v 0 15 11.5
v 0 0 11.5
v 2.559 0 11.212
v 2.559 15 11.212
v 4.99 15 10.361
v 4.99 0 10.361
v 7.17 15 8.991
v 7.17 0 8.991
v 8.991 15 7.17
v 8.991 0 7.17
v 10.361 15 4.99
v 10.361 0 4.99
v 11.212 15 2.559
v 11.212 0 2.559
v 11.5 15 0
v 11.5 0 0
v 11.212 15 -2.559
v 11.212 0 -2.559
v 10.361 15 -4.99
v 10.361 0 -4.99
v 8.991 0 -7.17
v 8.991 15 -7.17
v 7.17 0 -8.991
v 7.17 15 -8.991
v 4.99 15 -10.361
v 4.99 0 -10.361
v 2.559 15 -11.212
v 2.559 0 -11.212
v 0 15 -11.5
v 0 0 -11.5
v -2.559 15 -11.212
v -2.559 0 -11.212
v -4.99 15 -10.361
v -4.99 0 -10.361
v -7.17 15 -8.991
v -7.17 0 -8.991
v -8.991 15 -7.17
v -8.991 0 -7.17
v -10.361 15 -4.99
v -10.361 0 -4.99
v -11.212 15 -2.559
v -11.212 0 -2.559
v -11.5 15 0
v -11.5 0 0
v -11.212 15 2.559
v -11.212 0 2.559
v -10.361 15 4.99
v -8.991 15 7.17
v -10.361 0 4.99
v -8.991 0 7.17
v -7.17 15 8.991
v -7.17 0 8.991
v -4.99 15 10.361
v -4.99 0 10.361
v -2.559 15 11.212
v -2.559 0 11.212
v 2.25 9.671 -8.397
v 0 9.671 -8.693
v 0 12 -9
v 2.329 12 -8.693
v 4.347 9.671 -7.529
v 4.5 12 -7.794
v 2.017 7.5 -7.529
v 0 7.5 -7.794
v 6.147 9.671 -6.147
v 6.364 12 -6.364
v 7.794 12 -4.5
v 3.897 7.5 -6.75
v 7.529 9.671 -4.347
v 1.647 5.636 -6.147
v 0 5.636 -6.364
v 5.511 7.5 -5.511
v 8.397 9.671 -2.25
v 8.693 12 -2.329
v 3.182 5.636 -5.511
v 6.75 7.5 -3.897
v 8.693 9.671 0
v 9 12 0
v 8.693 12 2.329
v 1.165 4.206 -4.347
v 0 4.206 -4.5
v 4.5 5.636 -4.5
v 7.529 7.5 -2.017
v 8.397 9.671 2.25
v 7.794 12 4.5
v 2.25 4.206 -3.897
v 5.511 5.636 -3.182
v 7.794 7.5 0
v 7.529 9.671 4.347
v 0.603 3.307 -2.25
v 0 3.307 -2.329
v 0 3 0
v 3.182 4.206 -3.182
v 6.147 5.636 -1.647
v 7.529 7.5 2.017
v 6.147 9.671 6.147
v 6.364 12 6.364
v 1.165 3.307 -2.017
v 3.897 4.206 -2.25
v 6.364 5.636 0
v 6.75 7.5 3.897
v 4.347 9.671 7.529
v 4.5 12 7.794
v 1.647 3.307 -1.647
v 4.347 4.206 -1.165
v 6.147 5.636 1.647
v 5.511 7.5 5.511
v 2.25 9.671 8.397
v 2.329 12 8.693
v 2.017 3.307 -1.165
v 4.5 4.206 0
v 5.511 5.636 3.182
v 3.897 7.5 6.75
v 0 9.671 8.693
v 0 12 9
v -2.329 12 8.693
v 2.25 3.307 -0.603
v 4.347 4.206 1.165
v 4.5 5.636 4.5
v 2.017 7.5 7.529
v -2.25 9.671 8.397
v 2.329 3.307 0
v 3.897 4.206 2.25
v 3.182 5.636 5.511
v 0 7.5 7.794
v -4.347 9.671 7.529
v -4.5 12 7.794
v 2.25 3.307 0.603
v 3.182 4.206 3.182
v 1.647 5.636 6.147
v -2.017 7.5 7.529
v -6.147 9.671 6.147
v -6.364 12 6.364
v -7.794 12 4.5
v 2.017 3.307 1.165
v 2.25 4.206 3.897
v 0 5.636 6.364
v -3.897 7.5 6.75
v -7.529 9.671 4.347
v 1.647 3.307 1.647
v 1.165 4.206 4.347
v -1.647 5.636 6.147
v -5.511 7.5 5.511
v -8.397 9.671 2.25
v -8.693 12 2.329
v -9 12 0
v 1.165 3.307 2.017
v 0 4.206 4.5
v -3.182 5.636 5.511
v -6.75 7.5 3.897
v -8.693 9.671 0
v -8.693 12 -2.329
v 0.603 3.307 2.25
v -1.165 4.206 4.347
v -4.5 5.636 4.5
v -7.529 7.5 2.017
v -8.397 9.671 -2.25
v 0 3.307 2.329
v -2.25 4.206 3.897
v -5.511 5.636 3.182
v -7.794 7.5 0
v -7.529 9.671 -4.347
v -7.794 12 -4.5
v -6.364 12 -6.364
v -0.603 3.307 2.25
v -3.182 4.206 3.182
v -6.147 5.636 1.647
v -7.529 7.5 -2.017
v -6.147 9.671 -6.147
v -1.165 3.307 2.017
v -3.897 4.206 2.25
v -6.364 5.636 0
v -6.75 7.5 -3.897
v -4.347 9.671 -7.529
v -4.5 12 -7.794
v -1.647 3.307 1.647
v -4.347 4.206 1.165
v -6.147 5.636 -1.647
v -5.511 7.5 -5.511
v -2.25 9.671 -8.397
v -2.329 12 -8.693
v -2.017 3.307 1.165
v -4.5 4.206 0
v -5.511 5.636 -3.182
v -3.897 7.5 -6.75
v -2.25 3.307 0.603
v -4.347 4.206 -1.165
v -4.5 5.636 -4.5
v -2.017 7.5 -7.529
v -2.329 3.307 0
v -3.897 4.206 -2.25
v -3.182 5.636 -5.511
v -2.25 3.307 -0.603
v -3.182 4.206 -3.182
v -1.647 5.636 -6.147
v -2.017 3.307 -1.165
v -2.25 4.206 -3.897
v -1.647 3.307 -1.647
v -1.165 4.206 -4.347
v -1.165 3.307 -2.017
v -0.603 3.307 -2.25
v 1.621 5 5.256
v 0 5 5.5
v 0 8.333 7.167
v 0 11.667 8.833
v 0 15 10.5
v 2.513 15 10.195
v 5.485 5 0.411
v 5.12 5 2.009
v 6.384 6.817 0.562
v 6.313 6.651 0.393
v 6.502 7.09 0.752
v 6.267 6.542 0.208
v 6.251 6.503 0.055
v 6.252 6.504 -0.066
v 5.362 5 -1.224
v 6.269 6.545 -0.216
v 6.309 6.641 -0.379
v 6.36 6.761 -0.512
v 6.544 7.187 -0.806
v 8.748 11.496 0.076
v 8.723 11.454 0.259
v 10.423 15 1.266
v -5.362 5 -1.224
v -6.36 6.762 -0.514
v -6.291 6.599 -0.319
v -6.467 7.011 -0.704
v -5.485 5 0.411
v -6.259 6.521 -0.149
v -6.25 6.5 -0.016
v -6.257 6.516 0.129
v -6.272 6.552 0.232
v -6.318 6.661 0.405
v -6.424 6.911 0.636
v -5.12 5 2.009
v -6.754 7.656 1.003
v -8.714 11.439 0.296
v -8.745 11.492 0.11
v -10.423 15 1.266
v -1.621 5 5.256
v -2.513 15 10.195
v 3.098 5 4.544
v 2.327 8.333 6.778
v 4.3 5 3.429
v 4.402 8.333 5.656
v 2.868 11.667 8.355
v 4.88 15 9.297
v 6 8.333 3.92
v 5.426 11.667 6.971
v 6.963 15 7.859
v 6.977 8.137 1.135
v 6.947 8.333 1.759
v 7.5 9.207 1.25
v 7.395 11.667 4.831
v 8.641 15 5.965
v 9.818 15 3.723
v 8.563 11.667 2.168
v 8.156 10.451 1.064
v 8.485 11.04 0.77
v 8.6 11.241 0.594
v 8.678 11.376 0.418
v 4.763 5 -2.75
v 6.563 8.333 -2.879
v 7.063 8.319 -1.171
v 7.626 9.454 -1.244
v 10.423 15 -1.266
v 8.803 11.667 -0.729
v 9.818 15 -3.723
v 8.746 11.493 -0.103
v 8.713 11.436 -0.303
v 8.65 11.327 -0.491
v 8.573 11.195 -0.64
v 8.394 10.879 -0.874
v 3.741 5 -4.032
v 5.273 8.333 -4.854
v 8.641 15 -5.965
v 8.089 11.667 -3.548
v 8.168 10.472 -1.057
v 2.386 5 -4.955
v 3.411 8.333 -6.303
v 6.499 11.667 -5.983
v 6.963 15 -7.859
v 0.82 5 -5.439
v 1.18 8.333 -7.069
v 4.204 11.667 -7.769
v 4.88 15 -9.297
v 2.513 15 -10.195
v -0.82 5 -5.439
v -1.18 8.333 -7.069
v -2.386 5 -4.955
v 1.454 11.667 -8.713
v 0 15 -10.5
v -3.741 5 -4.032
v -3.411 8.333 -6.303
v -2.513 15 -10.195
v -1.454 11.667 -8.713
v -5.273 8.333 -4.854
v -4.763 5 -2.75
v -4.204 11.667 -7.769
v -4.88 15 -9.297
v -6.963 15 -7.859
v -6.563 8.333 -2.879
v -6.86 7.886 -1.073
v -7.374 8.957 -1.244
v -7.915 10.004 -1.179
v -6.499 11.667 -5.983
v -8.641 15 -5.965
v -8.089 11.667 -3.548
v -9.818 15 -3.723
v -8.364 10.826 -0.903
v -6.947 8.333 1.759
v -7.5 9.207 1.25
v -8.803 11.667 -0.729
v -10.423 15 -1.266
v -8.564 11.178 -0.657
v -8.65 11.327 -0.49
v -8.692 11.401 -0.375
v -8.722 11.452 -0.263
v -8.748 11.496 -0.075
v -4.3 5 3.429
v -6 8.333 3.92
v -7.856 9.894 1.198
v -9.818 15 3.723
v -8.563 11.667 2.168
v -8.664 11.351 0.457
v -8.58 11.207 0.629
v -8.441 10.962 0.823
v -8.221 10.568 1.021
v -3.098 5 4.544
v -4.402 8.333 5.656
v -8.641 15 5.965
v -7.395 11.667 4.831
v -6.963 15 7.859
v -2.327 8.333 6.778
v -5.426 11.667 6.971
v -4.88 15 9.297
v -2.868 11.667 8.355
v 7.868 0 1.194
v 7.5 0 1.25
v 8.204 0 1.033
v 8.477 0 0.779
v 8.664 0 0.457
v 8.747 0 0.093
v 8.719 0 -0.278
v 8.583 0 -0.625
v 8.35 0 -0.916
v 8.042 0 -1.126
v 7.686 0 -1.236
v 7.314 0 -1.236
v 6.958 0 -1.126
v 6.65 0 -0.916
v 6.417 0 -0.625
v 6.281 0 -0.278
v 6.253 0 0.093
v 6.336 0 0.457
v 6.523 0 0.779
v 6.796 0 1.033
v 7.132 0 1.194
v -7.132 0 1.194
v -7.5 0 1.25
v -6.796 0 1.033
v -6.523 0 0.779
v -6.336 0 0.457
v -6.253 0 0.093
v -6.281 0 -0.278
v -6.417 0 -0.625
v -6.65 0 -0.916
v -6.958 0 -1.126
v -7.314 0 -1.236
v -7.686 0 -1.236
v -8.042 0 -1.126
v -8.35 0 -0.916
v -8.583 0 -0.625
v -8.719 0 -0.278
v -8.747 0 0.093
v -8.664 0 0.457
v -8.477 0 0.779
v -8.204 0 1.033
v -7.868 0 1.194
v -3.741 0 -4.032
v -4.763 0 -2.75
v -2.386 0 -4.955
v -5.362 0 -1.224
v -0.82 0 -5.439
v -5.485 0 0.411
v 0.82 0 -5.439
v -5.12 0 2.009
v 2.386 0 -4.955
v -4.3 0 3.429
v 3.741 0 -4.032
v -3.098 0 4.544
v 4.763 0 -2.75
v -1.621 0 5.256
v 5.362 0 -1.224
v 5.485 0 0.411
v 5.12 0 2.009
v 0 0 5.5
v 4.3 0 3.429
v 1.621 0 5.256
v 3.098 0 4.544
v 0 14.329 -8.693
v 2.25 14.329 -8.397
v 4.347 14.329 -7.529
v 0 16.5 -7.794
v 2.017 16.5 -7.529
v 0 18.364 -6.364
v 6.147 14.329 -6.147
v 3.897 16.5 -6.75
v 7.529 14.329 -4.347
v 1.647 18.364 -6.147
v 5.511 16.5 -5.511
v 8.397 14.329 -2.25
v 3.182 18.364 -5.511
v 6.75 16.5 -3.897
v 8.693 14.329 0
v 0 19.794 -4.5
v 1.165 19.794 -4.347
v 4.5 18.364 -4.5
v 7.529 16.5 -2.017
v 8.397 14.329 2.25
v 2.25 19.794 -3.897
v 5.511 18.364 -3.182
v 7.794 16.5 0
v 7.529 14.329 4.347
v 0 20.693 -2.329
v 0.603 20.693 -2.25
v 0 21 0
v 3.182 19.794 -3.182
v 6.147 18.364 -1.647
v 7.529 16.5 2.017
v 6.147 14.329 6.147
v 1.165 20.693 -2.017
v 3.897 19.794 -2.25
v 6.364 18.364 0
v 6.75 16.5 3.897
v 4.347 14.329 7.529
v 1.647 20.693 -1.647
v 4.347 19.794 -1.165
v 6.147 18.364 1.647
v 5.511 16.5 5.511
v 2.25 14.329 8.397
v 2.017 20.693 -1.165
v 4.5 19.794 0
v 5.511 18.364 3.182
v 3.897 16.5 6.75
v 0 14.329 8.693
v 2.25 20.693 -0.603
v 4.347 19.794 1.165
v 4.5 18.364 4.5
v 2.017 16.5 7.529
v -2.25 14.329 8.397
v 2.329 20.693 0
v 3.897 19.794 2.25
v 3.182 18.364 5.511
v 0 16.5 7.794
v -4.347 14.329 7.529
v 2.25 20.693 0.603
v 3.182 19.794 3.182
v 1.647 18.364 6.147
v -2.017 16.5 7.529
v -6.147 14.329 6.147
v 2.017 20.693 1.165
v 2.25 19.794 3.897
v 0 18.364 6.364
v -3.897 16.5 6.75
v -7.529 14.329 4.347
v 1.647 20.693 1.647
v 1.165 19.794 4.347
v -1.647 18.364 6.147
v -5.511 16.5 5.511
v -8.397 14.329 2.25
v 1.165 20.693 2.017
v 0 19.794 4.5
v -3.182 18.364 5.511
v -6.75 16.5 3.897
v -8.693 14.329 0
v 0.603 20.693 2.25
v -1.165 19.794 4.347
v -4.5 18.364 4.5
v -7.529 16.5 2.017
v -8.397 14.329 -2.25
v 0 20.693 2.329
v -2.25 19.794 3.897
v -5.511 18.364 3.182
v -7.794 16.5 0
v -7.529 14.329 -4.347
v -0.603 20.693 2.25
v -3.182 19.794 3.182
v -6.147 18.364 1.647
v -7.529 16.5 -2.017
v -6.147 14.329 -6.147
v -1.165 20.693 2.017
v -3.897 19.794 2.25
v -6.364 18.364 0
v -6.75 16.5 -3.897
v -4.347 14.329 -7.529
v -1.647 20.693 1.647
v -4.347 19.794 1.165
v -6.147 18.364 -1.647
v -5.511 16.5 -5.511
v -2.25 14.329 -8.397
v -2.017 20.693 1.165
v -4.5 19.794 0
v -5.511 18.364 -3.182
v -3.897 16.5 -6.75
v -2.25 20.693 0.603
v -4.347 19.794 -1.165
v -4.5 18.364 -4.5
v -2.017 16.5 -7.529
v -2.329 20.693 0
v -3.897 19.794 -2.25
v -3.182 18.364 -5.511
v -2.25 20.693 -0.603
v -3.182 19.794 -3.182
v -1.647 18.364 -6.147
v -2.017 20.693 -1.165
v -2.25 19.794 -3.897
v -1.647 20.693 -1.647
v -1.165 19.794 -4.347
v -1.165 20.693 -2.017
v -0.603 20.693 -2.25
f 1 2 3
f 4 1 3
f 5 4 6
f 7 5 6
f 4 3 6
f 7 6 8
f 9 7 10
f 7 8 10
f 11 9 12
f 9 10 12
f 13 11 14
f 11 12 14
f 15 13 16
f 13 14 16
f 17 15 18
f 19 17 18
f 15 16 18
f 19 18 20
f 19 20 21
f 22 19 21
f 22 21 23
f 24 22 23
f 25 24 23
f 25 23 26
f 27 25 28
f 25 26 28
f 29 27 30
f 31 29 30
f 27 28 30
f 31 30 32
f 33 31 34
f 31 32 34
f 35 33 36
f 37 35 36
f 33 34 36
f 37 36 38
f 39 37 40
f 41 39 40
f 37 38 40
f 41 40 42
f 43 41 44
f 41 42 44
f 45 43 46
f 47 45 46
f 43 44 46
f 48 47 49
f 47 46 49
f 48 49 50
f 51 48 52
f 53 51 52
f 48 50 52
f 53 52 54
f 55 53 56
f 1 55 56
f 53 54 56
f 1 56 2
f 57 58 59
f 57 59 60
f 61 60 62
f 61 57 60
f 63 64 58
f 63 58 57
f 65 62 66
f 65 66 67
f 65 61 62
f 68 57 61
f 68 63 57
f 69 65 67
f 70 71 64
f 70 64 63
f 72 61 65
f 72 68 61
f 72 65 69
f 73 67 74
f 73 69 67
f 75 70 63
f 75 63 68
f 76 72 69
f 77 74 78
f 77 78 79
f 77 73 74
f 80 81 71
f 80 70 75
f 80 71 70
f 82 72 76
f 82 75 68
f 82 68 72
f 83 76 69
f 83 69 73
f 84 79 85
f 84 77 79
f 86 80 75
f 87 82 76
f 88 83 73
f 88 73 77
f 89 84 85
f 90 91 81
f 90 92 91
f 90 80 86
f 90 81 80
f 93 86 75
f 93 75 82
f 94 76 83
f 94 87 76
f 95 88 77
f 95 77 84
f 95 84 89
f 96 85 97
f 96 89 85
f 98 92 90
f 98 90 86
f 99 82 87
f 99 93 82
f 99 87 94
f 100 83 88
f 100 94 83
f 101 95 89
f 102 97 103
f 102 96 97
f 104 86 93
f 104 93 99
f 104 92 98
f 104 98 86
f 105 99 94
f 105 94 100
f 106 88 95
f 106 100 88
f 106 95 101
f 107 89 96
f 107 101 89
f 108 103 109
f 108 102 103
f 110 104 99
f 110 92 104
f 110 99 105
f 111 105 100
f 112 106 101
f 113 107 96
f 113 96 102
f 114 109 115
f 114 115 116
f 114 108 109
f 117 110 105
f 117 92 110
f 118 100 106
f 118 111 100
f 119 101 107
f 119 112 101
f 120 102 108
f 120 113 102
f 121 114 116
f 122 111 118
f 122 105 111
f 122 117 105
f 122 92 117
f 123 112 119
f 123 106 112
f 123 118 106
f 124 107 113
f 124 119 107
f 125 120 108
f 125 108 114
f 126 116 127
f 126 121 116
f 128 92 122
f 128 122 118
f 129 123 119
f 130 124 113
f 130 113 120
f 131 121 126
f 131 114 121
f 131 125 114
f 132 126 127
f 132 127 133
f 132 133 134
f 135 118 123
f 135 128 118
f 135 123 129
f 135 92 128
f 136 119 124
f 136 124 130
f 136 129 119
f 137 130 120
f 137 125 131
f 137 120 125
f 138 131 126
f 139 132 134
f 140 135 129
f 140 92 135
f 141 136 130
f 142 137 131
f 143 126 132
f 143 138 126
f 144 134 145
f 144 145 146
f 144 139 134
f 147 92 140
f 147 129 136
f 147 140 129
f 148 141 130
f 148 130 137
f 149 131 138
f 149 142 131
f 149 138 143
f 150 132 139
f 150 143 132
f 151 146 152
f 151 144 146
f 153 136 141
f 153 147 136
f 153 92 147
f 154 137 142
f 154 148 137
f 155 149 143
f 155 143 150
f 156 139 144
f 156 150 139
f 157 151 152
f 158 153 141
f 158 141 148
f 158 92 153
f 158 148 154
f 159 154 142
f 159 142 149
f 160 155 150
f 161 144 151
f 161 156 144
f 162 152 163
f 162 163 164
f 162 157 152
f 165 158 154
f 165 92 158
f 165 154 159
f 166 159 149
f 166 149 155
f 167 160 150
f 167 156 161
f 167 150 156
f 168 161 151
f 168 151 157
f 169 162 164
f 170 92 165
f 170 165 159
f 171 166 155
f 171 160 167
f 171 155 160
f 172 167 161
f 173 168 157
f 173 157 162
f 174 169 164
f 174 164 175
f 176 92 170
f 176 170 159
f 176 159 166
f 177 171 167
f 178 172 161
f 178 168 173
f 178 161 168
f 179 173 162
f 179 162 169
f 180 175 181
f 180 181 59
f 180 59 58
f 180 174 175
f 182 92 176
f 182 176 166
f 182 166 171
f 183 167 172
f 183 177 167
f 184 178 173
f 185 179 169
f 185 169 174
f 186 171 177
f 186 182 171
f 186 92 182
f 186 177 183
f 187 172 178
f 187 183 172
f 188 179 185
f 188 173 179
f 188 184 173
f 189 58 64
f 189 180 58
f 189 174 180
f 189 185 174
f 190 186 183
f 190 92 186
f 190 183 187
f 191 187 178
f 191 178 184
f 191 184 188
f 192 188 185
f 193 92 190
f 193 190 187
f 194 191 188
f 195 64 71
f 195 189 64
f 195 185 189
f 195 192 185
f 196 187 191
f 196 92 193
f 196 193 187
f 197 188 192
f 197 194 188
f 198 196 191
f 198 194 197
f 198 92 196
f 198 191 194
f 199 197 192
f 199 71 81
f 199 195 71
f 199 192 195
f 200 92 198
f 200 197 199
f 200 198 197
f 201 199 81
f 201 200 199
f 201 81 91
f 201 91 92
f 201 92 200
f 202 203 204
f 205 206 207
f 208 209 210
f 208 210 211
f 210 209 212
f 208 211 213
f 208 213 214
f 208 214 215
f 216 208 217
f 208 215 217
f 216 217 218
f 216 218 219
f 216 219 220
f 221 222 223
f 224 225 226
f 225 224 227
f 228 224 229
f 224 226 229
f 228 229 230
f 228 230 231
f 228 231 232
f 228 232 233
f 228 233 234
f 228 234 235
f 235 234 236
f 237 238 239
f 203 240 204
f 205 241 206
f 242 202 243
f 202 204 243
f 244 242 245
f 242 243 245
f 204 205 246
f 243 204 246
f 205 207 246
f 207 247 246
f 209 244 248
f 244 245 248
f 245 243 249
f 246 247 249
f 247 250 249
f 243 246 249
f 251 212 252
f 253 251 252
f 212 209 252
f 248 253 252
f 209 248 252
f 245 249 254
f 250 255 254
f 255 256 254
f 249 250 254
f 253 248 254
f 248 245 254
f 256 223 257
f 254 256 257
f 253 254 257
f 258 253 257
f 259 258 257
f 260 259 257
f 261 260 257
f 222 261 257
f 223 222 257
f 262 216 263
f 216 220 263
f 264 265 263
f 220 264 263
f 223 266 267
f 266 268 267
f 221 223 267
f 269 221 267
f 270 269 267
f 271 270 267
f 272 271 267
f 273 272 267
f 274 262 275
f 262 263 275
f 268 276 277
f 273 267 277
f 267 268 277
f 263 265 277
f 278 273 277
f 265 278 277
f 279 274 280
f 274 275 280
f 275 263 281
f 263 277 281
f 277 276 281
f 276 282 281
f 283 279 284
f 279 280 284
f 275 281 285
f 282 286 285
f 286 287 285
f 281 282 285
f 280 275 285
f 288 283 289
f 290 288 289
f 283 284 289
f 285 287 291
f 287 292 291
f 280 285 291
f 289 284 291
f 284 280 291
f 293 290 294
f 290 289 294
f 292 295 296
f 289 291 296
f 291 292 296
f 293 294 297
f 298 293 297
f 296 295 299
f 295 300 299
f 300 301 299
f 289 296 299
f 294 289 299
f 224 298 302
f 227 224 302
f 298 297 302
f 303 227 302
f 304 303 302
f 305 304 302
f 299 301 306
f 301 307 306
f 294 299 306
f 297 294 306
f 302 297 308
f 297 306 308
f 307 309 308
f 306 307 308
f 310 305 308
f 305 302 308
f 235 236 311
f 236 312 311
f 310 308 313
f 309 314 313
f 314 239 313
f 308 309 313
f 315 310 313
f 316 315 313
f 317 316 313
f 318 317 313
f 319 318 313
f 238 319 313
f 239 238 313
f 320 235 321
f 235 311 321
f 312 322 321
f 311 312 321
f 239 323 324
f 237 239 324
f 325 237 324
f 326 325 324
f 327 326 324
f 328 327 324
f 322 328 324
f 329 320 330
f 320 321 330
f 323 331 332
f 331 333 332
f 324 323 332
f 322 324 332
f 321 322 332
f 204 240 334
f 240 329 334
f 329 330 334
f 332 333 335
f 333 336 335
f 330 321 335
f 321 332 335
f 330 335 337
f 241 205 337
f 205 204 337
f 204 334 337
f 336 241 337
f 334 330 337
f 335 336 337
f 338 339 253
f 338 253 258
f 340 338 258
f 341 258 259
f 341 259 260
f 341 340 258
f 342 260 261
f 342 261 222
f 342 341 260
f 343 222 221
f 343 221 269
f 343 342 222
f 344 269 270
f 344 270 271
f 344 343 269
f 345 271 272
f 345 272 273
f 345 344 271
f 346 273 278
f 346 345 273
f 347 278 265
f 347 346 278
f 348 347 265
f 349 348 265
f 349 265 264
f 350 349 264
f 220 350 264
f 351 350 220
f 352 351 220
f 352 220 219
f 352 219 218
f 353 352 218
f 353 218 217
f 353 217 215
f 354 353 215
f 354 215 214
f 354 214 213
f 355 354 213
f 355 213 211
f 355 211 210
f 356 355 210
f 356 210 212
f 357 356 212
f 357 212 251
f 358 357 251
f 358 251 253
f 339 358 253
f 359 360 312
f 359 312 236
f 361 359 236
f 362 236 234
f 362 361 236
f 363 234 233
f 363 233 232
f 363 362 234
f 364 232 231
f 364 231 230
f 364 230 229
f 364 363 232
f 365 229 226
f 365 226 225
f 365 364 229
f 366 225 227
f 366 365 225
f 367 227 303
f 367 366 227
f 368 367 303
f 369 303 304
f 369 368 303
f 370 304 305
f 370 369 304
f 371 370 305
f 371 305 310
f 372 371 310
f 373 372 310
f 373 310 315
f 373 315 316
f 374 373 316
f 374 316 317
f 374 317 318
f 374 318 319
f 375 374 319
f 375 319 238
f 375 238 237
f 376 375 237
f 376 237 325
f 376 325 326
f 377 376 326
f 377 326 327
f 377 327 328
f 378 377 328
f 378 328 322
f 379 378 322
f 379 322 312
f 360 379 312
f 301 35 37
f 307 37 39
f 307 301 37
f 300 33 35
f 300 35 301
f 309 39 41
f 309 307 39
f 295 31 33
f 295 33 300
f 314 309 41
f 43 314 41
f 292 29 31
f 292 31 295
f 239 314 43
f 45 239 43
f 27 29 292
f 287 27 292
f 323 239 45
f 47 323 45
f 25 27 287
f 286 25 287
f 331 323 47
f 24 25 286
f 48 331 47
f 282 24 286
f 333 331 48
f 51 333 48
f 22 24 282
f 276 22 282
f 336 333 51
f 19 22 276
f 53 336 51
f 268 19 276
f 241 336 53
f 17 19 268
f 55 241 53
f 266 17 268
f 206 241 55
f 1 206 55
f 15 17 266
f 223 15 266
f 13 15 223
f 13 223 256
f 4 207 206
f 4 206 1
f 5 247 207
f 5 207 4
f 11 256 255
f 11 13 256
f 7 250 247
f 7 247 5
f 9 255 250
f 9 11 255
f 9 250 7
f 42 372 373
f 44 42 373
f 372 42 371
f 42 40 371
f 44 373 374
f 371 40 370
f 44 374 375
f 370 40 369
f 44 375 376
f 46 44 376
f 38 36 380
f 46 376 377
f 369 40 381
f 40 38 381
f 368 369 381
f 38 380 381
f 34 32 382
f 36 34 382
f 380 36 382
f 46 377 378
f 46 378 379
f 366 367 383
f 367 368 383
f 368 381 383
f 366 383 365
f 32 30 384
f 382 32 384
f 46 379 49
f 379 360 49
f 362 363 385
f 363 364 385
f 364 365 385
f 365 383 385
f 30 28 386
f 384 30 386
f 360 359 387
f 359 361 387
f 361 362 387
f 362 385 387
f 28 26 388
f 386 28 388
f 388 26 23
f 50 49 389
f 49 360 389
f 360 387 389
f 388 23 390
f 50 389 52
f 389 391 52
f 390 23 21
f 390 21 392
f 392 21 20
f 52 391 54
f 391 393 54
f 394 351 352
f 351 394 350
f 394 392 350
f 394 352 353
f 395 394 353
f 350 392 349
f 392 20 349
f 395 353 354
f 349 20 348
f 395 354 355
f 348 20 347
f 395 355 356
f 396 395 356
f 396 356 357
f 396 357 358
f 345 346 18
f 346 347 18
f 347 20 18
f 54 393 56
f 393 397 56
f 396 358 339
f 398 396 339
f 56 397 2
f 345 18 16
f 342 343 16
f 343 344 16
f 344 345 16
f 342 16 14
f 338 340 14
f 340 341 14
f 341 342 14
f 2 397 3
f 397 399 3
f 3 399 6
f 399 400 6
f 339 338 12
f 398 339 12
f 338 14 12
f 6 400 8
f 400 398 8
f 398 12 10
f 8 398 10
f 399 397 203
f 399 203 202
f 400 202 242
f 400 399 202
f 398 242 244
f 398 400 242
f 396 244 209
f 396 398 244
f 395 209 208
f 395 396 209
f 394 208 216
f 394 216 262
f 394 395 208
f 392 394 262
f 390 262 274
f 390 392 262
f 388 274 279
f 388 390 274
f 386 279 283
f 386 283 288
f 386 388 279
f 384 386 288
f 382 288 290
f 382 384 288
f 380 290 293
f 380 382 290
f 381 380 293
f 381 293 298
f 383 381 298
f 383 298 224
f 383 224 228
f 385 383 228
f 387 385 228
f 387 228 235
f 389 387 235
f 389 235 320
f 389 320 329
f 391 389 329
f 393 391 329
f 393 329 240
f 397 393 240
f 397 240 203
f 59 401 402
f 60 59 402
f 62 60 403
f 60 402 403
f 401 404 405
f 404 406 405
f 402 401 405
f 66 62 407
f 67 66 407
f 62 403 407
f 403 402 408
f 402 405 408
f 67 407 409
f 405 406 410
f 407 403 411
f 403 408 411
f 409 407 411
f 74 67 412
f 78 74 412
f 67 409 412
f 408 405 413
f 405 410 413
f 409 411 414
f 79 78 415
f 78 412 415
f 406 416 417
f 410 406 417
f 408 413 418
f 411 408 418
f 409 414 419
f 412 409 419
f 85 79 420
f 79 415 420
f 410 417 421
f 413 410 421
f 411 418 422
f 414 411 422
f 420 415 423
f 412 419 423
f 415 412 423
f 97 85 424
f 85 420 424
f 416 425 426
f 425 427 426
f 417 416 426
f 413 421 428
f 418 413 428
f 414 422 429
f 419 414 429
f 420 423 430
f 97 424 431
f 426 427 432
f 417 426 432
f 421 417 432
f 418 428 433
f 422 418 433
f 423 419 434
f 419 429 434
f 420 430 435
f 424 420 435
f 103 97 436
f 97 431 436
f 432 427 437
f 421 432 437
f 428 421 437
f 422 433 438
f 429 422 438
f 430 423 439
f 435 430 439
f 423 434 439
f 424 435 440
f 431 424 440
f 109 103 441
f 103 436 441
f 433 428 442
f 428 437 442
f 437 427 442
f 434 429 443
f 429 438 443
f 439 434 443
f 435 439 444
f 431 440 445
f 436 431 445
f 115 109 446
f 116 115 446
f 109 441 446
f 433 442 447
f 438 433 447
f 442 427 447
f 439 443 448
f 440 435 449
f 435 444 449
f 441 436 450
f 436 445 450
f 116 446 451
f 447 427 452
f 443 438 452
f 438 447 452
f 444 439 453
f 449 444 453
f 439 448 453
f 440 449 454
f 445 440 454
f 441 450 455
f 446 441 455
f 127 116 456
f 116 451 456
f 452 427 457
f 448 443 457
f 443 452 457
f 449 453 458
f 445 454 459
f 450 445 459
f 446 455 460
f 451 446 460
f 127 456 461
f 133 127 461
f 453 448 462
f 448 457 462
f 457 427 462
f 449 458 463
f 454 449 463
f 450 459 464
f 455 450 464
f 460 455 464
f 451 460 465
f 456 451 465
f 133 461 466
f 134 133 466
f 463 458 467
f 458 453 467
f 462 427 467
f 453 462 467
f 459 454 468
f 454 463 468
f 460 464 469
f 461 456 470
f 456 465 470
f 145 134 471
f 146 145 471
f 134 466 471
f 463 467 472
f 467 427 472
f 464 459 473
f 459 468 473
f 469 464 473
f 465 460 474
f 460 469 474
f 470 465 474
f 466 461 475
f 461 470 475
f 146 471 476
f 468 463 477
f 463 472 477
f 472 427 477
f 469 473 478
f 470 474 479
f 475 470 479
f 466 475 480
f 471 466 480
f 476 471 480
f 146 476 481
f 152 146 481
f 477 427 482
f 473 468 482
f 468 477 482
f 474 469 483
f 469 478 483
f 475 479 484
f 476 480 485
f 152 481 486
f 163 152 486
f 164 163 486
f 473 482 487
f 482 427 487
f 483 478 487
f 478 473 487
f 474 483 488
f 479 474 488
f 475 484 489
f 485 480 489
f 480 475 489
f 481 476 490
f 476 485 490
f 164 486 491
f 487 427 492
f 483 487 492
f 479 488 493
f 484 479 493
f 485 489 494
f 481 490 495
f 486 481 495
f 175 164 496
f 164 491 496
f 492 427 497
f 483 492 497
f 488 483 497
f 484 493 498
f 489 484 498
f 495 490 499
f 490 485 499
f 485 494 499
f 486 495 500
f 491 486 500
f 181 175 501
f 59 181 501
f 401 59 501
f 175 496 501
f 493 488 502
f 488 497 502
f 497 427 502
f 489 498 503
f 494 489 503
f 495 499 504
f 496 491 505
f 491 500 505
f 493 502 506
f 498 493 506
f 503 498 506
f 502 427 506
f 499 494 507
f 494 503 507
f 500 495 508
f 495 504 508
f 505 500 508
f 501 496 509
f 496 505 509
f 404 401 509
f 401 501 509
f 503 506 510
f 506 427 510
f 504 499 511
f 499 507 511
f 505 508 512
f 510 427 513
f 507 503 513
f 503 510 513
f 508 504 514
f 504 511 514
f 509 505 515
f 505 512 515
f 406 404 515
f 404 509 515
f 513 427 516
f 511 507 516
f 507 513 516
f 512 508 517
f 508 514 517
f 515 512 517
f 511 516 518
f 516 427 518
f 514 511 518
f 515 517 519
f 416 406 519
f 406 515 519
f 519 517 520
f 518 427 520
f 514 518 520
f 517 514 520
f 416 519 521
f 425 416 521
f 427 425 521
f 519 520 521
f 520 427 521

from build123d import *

# Parameters (mm, degrees)
SKETCH1_R           = 11.5
SKETCH1_R_2         = 5.5
SKETCH1_R_3         = 1.25
BOSS_EXTRUDE1_DEPTH = 15
CHAMFER1_SIZE       = 10
CHAMFER1_SIZE_2     = 5
SKETCH2_R           = 9
BOSS_EXTRUDE2_DEPTH = 9
FILLET1_R           = 9


# Some blends are built 0.0001 mm under size
with BuildPart() as part:
    # Sketch1 → Boss-Extrude1 (new body)
    with BuildSketch(Plane(origin=(0, 0, 0), x_dir=(1, 0, 0), z_dir=(0, 1, 0))):
        with Locations(Location((0, 0, 0), (0, 0, 270))):
            Circle(SKETCH1_R)
        with Locations(Location((0, 0, 0), (0, 0, 270))):
            Circle(SKETCH1_R_2, mode=Mode.SUBTRACT)
        with Locations(Location((7.5, 0, 0), (0, 0, 270))):
            Circle(SKETCH1_R_3, mode=Mode.SUBTRACT)
        with Locations(Location((-7.5, 0, 0), (0, 0, 270))):
            Circle(SKETCH1_R_3, mode=Mode.SUBTRACT)
    extrude(amount=BOSS_EXTRUDE1_DEPTH)

    # Chamfer1
    # the kernel refuses this chamfer: 10, 5 mm, written as the material it takes off along each edge
    with BuildSketch(Plane(origin=(0, 15, 0), x_dir=(0, 0, 1), z_dir=(-1, 0, 0))) as chamfer1_piece_1:
        Polygon((5.5, -CHAMFER1_SIZE), (5.5 + CHAMFER1_SIZE_2, 0), (5.5, 0), align=None)
    revolve(axis=Axis((0, 15, 0), (0, 1, 0)), mode=Mode.SUBTRACT)


with BuildPart() as body_2:
    # Sketch2 → Boss-Extrude2 (new, symmetric)
    with BuildSketch(Plane(origin=(0, 12, 0), x_dir=(-1, 0, 0), z_dir=(0, -1, 0))):
        with Locations(Location((0, 0, 0), (0, 0, 90))):
            Circle(SKETCH2_R)
    extrude(amount=BOSS_EXTRUDE2_DEPTH, both=True)

    # Fillet1
    fillet1_edges = [body_2.edges().sort_by_distance(p)[0] for p in [
        (0, 21, 9),
        (0, 3, 9),
    ]]
    fillet(fillet1_edges, radius=FILLET1_R - 0.0001)  # a hair under: the kernel refuses the full size


solid = Compound([part.part, body_2.part])
